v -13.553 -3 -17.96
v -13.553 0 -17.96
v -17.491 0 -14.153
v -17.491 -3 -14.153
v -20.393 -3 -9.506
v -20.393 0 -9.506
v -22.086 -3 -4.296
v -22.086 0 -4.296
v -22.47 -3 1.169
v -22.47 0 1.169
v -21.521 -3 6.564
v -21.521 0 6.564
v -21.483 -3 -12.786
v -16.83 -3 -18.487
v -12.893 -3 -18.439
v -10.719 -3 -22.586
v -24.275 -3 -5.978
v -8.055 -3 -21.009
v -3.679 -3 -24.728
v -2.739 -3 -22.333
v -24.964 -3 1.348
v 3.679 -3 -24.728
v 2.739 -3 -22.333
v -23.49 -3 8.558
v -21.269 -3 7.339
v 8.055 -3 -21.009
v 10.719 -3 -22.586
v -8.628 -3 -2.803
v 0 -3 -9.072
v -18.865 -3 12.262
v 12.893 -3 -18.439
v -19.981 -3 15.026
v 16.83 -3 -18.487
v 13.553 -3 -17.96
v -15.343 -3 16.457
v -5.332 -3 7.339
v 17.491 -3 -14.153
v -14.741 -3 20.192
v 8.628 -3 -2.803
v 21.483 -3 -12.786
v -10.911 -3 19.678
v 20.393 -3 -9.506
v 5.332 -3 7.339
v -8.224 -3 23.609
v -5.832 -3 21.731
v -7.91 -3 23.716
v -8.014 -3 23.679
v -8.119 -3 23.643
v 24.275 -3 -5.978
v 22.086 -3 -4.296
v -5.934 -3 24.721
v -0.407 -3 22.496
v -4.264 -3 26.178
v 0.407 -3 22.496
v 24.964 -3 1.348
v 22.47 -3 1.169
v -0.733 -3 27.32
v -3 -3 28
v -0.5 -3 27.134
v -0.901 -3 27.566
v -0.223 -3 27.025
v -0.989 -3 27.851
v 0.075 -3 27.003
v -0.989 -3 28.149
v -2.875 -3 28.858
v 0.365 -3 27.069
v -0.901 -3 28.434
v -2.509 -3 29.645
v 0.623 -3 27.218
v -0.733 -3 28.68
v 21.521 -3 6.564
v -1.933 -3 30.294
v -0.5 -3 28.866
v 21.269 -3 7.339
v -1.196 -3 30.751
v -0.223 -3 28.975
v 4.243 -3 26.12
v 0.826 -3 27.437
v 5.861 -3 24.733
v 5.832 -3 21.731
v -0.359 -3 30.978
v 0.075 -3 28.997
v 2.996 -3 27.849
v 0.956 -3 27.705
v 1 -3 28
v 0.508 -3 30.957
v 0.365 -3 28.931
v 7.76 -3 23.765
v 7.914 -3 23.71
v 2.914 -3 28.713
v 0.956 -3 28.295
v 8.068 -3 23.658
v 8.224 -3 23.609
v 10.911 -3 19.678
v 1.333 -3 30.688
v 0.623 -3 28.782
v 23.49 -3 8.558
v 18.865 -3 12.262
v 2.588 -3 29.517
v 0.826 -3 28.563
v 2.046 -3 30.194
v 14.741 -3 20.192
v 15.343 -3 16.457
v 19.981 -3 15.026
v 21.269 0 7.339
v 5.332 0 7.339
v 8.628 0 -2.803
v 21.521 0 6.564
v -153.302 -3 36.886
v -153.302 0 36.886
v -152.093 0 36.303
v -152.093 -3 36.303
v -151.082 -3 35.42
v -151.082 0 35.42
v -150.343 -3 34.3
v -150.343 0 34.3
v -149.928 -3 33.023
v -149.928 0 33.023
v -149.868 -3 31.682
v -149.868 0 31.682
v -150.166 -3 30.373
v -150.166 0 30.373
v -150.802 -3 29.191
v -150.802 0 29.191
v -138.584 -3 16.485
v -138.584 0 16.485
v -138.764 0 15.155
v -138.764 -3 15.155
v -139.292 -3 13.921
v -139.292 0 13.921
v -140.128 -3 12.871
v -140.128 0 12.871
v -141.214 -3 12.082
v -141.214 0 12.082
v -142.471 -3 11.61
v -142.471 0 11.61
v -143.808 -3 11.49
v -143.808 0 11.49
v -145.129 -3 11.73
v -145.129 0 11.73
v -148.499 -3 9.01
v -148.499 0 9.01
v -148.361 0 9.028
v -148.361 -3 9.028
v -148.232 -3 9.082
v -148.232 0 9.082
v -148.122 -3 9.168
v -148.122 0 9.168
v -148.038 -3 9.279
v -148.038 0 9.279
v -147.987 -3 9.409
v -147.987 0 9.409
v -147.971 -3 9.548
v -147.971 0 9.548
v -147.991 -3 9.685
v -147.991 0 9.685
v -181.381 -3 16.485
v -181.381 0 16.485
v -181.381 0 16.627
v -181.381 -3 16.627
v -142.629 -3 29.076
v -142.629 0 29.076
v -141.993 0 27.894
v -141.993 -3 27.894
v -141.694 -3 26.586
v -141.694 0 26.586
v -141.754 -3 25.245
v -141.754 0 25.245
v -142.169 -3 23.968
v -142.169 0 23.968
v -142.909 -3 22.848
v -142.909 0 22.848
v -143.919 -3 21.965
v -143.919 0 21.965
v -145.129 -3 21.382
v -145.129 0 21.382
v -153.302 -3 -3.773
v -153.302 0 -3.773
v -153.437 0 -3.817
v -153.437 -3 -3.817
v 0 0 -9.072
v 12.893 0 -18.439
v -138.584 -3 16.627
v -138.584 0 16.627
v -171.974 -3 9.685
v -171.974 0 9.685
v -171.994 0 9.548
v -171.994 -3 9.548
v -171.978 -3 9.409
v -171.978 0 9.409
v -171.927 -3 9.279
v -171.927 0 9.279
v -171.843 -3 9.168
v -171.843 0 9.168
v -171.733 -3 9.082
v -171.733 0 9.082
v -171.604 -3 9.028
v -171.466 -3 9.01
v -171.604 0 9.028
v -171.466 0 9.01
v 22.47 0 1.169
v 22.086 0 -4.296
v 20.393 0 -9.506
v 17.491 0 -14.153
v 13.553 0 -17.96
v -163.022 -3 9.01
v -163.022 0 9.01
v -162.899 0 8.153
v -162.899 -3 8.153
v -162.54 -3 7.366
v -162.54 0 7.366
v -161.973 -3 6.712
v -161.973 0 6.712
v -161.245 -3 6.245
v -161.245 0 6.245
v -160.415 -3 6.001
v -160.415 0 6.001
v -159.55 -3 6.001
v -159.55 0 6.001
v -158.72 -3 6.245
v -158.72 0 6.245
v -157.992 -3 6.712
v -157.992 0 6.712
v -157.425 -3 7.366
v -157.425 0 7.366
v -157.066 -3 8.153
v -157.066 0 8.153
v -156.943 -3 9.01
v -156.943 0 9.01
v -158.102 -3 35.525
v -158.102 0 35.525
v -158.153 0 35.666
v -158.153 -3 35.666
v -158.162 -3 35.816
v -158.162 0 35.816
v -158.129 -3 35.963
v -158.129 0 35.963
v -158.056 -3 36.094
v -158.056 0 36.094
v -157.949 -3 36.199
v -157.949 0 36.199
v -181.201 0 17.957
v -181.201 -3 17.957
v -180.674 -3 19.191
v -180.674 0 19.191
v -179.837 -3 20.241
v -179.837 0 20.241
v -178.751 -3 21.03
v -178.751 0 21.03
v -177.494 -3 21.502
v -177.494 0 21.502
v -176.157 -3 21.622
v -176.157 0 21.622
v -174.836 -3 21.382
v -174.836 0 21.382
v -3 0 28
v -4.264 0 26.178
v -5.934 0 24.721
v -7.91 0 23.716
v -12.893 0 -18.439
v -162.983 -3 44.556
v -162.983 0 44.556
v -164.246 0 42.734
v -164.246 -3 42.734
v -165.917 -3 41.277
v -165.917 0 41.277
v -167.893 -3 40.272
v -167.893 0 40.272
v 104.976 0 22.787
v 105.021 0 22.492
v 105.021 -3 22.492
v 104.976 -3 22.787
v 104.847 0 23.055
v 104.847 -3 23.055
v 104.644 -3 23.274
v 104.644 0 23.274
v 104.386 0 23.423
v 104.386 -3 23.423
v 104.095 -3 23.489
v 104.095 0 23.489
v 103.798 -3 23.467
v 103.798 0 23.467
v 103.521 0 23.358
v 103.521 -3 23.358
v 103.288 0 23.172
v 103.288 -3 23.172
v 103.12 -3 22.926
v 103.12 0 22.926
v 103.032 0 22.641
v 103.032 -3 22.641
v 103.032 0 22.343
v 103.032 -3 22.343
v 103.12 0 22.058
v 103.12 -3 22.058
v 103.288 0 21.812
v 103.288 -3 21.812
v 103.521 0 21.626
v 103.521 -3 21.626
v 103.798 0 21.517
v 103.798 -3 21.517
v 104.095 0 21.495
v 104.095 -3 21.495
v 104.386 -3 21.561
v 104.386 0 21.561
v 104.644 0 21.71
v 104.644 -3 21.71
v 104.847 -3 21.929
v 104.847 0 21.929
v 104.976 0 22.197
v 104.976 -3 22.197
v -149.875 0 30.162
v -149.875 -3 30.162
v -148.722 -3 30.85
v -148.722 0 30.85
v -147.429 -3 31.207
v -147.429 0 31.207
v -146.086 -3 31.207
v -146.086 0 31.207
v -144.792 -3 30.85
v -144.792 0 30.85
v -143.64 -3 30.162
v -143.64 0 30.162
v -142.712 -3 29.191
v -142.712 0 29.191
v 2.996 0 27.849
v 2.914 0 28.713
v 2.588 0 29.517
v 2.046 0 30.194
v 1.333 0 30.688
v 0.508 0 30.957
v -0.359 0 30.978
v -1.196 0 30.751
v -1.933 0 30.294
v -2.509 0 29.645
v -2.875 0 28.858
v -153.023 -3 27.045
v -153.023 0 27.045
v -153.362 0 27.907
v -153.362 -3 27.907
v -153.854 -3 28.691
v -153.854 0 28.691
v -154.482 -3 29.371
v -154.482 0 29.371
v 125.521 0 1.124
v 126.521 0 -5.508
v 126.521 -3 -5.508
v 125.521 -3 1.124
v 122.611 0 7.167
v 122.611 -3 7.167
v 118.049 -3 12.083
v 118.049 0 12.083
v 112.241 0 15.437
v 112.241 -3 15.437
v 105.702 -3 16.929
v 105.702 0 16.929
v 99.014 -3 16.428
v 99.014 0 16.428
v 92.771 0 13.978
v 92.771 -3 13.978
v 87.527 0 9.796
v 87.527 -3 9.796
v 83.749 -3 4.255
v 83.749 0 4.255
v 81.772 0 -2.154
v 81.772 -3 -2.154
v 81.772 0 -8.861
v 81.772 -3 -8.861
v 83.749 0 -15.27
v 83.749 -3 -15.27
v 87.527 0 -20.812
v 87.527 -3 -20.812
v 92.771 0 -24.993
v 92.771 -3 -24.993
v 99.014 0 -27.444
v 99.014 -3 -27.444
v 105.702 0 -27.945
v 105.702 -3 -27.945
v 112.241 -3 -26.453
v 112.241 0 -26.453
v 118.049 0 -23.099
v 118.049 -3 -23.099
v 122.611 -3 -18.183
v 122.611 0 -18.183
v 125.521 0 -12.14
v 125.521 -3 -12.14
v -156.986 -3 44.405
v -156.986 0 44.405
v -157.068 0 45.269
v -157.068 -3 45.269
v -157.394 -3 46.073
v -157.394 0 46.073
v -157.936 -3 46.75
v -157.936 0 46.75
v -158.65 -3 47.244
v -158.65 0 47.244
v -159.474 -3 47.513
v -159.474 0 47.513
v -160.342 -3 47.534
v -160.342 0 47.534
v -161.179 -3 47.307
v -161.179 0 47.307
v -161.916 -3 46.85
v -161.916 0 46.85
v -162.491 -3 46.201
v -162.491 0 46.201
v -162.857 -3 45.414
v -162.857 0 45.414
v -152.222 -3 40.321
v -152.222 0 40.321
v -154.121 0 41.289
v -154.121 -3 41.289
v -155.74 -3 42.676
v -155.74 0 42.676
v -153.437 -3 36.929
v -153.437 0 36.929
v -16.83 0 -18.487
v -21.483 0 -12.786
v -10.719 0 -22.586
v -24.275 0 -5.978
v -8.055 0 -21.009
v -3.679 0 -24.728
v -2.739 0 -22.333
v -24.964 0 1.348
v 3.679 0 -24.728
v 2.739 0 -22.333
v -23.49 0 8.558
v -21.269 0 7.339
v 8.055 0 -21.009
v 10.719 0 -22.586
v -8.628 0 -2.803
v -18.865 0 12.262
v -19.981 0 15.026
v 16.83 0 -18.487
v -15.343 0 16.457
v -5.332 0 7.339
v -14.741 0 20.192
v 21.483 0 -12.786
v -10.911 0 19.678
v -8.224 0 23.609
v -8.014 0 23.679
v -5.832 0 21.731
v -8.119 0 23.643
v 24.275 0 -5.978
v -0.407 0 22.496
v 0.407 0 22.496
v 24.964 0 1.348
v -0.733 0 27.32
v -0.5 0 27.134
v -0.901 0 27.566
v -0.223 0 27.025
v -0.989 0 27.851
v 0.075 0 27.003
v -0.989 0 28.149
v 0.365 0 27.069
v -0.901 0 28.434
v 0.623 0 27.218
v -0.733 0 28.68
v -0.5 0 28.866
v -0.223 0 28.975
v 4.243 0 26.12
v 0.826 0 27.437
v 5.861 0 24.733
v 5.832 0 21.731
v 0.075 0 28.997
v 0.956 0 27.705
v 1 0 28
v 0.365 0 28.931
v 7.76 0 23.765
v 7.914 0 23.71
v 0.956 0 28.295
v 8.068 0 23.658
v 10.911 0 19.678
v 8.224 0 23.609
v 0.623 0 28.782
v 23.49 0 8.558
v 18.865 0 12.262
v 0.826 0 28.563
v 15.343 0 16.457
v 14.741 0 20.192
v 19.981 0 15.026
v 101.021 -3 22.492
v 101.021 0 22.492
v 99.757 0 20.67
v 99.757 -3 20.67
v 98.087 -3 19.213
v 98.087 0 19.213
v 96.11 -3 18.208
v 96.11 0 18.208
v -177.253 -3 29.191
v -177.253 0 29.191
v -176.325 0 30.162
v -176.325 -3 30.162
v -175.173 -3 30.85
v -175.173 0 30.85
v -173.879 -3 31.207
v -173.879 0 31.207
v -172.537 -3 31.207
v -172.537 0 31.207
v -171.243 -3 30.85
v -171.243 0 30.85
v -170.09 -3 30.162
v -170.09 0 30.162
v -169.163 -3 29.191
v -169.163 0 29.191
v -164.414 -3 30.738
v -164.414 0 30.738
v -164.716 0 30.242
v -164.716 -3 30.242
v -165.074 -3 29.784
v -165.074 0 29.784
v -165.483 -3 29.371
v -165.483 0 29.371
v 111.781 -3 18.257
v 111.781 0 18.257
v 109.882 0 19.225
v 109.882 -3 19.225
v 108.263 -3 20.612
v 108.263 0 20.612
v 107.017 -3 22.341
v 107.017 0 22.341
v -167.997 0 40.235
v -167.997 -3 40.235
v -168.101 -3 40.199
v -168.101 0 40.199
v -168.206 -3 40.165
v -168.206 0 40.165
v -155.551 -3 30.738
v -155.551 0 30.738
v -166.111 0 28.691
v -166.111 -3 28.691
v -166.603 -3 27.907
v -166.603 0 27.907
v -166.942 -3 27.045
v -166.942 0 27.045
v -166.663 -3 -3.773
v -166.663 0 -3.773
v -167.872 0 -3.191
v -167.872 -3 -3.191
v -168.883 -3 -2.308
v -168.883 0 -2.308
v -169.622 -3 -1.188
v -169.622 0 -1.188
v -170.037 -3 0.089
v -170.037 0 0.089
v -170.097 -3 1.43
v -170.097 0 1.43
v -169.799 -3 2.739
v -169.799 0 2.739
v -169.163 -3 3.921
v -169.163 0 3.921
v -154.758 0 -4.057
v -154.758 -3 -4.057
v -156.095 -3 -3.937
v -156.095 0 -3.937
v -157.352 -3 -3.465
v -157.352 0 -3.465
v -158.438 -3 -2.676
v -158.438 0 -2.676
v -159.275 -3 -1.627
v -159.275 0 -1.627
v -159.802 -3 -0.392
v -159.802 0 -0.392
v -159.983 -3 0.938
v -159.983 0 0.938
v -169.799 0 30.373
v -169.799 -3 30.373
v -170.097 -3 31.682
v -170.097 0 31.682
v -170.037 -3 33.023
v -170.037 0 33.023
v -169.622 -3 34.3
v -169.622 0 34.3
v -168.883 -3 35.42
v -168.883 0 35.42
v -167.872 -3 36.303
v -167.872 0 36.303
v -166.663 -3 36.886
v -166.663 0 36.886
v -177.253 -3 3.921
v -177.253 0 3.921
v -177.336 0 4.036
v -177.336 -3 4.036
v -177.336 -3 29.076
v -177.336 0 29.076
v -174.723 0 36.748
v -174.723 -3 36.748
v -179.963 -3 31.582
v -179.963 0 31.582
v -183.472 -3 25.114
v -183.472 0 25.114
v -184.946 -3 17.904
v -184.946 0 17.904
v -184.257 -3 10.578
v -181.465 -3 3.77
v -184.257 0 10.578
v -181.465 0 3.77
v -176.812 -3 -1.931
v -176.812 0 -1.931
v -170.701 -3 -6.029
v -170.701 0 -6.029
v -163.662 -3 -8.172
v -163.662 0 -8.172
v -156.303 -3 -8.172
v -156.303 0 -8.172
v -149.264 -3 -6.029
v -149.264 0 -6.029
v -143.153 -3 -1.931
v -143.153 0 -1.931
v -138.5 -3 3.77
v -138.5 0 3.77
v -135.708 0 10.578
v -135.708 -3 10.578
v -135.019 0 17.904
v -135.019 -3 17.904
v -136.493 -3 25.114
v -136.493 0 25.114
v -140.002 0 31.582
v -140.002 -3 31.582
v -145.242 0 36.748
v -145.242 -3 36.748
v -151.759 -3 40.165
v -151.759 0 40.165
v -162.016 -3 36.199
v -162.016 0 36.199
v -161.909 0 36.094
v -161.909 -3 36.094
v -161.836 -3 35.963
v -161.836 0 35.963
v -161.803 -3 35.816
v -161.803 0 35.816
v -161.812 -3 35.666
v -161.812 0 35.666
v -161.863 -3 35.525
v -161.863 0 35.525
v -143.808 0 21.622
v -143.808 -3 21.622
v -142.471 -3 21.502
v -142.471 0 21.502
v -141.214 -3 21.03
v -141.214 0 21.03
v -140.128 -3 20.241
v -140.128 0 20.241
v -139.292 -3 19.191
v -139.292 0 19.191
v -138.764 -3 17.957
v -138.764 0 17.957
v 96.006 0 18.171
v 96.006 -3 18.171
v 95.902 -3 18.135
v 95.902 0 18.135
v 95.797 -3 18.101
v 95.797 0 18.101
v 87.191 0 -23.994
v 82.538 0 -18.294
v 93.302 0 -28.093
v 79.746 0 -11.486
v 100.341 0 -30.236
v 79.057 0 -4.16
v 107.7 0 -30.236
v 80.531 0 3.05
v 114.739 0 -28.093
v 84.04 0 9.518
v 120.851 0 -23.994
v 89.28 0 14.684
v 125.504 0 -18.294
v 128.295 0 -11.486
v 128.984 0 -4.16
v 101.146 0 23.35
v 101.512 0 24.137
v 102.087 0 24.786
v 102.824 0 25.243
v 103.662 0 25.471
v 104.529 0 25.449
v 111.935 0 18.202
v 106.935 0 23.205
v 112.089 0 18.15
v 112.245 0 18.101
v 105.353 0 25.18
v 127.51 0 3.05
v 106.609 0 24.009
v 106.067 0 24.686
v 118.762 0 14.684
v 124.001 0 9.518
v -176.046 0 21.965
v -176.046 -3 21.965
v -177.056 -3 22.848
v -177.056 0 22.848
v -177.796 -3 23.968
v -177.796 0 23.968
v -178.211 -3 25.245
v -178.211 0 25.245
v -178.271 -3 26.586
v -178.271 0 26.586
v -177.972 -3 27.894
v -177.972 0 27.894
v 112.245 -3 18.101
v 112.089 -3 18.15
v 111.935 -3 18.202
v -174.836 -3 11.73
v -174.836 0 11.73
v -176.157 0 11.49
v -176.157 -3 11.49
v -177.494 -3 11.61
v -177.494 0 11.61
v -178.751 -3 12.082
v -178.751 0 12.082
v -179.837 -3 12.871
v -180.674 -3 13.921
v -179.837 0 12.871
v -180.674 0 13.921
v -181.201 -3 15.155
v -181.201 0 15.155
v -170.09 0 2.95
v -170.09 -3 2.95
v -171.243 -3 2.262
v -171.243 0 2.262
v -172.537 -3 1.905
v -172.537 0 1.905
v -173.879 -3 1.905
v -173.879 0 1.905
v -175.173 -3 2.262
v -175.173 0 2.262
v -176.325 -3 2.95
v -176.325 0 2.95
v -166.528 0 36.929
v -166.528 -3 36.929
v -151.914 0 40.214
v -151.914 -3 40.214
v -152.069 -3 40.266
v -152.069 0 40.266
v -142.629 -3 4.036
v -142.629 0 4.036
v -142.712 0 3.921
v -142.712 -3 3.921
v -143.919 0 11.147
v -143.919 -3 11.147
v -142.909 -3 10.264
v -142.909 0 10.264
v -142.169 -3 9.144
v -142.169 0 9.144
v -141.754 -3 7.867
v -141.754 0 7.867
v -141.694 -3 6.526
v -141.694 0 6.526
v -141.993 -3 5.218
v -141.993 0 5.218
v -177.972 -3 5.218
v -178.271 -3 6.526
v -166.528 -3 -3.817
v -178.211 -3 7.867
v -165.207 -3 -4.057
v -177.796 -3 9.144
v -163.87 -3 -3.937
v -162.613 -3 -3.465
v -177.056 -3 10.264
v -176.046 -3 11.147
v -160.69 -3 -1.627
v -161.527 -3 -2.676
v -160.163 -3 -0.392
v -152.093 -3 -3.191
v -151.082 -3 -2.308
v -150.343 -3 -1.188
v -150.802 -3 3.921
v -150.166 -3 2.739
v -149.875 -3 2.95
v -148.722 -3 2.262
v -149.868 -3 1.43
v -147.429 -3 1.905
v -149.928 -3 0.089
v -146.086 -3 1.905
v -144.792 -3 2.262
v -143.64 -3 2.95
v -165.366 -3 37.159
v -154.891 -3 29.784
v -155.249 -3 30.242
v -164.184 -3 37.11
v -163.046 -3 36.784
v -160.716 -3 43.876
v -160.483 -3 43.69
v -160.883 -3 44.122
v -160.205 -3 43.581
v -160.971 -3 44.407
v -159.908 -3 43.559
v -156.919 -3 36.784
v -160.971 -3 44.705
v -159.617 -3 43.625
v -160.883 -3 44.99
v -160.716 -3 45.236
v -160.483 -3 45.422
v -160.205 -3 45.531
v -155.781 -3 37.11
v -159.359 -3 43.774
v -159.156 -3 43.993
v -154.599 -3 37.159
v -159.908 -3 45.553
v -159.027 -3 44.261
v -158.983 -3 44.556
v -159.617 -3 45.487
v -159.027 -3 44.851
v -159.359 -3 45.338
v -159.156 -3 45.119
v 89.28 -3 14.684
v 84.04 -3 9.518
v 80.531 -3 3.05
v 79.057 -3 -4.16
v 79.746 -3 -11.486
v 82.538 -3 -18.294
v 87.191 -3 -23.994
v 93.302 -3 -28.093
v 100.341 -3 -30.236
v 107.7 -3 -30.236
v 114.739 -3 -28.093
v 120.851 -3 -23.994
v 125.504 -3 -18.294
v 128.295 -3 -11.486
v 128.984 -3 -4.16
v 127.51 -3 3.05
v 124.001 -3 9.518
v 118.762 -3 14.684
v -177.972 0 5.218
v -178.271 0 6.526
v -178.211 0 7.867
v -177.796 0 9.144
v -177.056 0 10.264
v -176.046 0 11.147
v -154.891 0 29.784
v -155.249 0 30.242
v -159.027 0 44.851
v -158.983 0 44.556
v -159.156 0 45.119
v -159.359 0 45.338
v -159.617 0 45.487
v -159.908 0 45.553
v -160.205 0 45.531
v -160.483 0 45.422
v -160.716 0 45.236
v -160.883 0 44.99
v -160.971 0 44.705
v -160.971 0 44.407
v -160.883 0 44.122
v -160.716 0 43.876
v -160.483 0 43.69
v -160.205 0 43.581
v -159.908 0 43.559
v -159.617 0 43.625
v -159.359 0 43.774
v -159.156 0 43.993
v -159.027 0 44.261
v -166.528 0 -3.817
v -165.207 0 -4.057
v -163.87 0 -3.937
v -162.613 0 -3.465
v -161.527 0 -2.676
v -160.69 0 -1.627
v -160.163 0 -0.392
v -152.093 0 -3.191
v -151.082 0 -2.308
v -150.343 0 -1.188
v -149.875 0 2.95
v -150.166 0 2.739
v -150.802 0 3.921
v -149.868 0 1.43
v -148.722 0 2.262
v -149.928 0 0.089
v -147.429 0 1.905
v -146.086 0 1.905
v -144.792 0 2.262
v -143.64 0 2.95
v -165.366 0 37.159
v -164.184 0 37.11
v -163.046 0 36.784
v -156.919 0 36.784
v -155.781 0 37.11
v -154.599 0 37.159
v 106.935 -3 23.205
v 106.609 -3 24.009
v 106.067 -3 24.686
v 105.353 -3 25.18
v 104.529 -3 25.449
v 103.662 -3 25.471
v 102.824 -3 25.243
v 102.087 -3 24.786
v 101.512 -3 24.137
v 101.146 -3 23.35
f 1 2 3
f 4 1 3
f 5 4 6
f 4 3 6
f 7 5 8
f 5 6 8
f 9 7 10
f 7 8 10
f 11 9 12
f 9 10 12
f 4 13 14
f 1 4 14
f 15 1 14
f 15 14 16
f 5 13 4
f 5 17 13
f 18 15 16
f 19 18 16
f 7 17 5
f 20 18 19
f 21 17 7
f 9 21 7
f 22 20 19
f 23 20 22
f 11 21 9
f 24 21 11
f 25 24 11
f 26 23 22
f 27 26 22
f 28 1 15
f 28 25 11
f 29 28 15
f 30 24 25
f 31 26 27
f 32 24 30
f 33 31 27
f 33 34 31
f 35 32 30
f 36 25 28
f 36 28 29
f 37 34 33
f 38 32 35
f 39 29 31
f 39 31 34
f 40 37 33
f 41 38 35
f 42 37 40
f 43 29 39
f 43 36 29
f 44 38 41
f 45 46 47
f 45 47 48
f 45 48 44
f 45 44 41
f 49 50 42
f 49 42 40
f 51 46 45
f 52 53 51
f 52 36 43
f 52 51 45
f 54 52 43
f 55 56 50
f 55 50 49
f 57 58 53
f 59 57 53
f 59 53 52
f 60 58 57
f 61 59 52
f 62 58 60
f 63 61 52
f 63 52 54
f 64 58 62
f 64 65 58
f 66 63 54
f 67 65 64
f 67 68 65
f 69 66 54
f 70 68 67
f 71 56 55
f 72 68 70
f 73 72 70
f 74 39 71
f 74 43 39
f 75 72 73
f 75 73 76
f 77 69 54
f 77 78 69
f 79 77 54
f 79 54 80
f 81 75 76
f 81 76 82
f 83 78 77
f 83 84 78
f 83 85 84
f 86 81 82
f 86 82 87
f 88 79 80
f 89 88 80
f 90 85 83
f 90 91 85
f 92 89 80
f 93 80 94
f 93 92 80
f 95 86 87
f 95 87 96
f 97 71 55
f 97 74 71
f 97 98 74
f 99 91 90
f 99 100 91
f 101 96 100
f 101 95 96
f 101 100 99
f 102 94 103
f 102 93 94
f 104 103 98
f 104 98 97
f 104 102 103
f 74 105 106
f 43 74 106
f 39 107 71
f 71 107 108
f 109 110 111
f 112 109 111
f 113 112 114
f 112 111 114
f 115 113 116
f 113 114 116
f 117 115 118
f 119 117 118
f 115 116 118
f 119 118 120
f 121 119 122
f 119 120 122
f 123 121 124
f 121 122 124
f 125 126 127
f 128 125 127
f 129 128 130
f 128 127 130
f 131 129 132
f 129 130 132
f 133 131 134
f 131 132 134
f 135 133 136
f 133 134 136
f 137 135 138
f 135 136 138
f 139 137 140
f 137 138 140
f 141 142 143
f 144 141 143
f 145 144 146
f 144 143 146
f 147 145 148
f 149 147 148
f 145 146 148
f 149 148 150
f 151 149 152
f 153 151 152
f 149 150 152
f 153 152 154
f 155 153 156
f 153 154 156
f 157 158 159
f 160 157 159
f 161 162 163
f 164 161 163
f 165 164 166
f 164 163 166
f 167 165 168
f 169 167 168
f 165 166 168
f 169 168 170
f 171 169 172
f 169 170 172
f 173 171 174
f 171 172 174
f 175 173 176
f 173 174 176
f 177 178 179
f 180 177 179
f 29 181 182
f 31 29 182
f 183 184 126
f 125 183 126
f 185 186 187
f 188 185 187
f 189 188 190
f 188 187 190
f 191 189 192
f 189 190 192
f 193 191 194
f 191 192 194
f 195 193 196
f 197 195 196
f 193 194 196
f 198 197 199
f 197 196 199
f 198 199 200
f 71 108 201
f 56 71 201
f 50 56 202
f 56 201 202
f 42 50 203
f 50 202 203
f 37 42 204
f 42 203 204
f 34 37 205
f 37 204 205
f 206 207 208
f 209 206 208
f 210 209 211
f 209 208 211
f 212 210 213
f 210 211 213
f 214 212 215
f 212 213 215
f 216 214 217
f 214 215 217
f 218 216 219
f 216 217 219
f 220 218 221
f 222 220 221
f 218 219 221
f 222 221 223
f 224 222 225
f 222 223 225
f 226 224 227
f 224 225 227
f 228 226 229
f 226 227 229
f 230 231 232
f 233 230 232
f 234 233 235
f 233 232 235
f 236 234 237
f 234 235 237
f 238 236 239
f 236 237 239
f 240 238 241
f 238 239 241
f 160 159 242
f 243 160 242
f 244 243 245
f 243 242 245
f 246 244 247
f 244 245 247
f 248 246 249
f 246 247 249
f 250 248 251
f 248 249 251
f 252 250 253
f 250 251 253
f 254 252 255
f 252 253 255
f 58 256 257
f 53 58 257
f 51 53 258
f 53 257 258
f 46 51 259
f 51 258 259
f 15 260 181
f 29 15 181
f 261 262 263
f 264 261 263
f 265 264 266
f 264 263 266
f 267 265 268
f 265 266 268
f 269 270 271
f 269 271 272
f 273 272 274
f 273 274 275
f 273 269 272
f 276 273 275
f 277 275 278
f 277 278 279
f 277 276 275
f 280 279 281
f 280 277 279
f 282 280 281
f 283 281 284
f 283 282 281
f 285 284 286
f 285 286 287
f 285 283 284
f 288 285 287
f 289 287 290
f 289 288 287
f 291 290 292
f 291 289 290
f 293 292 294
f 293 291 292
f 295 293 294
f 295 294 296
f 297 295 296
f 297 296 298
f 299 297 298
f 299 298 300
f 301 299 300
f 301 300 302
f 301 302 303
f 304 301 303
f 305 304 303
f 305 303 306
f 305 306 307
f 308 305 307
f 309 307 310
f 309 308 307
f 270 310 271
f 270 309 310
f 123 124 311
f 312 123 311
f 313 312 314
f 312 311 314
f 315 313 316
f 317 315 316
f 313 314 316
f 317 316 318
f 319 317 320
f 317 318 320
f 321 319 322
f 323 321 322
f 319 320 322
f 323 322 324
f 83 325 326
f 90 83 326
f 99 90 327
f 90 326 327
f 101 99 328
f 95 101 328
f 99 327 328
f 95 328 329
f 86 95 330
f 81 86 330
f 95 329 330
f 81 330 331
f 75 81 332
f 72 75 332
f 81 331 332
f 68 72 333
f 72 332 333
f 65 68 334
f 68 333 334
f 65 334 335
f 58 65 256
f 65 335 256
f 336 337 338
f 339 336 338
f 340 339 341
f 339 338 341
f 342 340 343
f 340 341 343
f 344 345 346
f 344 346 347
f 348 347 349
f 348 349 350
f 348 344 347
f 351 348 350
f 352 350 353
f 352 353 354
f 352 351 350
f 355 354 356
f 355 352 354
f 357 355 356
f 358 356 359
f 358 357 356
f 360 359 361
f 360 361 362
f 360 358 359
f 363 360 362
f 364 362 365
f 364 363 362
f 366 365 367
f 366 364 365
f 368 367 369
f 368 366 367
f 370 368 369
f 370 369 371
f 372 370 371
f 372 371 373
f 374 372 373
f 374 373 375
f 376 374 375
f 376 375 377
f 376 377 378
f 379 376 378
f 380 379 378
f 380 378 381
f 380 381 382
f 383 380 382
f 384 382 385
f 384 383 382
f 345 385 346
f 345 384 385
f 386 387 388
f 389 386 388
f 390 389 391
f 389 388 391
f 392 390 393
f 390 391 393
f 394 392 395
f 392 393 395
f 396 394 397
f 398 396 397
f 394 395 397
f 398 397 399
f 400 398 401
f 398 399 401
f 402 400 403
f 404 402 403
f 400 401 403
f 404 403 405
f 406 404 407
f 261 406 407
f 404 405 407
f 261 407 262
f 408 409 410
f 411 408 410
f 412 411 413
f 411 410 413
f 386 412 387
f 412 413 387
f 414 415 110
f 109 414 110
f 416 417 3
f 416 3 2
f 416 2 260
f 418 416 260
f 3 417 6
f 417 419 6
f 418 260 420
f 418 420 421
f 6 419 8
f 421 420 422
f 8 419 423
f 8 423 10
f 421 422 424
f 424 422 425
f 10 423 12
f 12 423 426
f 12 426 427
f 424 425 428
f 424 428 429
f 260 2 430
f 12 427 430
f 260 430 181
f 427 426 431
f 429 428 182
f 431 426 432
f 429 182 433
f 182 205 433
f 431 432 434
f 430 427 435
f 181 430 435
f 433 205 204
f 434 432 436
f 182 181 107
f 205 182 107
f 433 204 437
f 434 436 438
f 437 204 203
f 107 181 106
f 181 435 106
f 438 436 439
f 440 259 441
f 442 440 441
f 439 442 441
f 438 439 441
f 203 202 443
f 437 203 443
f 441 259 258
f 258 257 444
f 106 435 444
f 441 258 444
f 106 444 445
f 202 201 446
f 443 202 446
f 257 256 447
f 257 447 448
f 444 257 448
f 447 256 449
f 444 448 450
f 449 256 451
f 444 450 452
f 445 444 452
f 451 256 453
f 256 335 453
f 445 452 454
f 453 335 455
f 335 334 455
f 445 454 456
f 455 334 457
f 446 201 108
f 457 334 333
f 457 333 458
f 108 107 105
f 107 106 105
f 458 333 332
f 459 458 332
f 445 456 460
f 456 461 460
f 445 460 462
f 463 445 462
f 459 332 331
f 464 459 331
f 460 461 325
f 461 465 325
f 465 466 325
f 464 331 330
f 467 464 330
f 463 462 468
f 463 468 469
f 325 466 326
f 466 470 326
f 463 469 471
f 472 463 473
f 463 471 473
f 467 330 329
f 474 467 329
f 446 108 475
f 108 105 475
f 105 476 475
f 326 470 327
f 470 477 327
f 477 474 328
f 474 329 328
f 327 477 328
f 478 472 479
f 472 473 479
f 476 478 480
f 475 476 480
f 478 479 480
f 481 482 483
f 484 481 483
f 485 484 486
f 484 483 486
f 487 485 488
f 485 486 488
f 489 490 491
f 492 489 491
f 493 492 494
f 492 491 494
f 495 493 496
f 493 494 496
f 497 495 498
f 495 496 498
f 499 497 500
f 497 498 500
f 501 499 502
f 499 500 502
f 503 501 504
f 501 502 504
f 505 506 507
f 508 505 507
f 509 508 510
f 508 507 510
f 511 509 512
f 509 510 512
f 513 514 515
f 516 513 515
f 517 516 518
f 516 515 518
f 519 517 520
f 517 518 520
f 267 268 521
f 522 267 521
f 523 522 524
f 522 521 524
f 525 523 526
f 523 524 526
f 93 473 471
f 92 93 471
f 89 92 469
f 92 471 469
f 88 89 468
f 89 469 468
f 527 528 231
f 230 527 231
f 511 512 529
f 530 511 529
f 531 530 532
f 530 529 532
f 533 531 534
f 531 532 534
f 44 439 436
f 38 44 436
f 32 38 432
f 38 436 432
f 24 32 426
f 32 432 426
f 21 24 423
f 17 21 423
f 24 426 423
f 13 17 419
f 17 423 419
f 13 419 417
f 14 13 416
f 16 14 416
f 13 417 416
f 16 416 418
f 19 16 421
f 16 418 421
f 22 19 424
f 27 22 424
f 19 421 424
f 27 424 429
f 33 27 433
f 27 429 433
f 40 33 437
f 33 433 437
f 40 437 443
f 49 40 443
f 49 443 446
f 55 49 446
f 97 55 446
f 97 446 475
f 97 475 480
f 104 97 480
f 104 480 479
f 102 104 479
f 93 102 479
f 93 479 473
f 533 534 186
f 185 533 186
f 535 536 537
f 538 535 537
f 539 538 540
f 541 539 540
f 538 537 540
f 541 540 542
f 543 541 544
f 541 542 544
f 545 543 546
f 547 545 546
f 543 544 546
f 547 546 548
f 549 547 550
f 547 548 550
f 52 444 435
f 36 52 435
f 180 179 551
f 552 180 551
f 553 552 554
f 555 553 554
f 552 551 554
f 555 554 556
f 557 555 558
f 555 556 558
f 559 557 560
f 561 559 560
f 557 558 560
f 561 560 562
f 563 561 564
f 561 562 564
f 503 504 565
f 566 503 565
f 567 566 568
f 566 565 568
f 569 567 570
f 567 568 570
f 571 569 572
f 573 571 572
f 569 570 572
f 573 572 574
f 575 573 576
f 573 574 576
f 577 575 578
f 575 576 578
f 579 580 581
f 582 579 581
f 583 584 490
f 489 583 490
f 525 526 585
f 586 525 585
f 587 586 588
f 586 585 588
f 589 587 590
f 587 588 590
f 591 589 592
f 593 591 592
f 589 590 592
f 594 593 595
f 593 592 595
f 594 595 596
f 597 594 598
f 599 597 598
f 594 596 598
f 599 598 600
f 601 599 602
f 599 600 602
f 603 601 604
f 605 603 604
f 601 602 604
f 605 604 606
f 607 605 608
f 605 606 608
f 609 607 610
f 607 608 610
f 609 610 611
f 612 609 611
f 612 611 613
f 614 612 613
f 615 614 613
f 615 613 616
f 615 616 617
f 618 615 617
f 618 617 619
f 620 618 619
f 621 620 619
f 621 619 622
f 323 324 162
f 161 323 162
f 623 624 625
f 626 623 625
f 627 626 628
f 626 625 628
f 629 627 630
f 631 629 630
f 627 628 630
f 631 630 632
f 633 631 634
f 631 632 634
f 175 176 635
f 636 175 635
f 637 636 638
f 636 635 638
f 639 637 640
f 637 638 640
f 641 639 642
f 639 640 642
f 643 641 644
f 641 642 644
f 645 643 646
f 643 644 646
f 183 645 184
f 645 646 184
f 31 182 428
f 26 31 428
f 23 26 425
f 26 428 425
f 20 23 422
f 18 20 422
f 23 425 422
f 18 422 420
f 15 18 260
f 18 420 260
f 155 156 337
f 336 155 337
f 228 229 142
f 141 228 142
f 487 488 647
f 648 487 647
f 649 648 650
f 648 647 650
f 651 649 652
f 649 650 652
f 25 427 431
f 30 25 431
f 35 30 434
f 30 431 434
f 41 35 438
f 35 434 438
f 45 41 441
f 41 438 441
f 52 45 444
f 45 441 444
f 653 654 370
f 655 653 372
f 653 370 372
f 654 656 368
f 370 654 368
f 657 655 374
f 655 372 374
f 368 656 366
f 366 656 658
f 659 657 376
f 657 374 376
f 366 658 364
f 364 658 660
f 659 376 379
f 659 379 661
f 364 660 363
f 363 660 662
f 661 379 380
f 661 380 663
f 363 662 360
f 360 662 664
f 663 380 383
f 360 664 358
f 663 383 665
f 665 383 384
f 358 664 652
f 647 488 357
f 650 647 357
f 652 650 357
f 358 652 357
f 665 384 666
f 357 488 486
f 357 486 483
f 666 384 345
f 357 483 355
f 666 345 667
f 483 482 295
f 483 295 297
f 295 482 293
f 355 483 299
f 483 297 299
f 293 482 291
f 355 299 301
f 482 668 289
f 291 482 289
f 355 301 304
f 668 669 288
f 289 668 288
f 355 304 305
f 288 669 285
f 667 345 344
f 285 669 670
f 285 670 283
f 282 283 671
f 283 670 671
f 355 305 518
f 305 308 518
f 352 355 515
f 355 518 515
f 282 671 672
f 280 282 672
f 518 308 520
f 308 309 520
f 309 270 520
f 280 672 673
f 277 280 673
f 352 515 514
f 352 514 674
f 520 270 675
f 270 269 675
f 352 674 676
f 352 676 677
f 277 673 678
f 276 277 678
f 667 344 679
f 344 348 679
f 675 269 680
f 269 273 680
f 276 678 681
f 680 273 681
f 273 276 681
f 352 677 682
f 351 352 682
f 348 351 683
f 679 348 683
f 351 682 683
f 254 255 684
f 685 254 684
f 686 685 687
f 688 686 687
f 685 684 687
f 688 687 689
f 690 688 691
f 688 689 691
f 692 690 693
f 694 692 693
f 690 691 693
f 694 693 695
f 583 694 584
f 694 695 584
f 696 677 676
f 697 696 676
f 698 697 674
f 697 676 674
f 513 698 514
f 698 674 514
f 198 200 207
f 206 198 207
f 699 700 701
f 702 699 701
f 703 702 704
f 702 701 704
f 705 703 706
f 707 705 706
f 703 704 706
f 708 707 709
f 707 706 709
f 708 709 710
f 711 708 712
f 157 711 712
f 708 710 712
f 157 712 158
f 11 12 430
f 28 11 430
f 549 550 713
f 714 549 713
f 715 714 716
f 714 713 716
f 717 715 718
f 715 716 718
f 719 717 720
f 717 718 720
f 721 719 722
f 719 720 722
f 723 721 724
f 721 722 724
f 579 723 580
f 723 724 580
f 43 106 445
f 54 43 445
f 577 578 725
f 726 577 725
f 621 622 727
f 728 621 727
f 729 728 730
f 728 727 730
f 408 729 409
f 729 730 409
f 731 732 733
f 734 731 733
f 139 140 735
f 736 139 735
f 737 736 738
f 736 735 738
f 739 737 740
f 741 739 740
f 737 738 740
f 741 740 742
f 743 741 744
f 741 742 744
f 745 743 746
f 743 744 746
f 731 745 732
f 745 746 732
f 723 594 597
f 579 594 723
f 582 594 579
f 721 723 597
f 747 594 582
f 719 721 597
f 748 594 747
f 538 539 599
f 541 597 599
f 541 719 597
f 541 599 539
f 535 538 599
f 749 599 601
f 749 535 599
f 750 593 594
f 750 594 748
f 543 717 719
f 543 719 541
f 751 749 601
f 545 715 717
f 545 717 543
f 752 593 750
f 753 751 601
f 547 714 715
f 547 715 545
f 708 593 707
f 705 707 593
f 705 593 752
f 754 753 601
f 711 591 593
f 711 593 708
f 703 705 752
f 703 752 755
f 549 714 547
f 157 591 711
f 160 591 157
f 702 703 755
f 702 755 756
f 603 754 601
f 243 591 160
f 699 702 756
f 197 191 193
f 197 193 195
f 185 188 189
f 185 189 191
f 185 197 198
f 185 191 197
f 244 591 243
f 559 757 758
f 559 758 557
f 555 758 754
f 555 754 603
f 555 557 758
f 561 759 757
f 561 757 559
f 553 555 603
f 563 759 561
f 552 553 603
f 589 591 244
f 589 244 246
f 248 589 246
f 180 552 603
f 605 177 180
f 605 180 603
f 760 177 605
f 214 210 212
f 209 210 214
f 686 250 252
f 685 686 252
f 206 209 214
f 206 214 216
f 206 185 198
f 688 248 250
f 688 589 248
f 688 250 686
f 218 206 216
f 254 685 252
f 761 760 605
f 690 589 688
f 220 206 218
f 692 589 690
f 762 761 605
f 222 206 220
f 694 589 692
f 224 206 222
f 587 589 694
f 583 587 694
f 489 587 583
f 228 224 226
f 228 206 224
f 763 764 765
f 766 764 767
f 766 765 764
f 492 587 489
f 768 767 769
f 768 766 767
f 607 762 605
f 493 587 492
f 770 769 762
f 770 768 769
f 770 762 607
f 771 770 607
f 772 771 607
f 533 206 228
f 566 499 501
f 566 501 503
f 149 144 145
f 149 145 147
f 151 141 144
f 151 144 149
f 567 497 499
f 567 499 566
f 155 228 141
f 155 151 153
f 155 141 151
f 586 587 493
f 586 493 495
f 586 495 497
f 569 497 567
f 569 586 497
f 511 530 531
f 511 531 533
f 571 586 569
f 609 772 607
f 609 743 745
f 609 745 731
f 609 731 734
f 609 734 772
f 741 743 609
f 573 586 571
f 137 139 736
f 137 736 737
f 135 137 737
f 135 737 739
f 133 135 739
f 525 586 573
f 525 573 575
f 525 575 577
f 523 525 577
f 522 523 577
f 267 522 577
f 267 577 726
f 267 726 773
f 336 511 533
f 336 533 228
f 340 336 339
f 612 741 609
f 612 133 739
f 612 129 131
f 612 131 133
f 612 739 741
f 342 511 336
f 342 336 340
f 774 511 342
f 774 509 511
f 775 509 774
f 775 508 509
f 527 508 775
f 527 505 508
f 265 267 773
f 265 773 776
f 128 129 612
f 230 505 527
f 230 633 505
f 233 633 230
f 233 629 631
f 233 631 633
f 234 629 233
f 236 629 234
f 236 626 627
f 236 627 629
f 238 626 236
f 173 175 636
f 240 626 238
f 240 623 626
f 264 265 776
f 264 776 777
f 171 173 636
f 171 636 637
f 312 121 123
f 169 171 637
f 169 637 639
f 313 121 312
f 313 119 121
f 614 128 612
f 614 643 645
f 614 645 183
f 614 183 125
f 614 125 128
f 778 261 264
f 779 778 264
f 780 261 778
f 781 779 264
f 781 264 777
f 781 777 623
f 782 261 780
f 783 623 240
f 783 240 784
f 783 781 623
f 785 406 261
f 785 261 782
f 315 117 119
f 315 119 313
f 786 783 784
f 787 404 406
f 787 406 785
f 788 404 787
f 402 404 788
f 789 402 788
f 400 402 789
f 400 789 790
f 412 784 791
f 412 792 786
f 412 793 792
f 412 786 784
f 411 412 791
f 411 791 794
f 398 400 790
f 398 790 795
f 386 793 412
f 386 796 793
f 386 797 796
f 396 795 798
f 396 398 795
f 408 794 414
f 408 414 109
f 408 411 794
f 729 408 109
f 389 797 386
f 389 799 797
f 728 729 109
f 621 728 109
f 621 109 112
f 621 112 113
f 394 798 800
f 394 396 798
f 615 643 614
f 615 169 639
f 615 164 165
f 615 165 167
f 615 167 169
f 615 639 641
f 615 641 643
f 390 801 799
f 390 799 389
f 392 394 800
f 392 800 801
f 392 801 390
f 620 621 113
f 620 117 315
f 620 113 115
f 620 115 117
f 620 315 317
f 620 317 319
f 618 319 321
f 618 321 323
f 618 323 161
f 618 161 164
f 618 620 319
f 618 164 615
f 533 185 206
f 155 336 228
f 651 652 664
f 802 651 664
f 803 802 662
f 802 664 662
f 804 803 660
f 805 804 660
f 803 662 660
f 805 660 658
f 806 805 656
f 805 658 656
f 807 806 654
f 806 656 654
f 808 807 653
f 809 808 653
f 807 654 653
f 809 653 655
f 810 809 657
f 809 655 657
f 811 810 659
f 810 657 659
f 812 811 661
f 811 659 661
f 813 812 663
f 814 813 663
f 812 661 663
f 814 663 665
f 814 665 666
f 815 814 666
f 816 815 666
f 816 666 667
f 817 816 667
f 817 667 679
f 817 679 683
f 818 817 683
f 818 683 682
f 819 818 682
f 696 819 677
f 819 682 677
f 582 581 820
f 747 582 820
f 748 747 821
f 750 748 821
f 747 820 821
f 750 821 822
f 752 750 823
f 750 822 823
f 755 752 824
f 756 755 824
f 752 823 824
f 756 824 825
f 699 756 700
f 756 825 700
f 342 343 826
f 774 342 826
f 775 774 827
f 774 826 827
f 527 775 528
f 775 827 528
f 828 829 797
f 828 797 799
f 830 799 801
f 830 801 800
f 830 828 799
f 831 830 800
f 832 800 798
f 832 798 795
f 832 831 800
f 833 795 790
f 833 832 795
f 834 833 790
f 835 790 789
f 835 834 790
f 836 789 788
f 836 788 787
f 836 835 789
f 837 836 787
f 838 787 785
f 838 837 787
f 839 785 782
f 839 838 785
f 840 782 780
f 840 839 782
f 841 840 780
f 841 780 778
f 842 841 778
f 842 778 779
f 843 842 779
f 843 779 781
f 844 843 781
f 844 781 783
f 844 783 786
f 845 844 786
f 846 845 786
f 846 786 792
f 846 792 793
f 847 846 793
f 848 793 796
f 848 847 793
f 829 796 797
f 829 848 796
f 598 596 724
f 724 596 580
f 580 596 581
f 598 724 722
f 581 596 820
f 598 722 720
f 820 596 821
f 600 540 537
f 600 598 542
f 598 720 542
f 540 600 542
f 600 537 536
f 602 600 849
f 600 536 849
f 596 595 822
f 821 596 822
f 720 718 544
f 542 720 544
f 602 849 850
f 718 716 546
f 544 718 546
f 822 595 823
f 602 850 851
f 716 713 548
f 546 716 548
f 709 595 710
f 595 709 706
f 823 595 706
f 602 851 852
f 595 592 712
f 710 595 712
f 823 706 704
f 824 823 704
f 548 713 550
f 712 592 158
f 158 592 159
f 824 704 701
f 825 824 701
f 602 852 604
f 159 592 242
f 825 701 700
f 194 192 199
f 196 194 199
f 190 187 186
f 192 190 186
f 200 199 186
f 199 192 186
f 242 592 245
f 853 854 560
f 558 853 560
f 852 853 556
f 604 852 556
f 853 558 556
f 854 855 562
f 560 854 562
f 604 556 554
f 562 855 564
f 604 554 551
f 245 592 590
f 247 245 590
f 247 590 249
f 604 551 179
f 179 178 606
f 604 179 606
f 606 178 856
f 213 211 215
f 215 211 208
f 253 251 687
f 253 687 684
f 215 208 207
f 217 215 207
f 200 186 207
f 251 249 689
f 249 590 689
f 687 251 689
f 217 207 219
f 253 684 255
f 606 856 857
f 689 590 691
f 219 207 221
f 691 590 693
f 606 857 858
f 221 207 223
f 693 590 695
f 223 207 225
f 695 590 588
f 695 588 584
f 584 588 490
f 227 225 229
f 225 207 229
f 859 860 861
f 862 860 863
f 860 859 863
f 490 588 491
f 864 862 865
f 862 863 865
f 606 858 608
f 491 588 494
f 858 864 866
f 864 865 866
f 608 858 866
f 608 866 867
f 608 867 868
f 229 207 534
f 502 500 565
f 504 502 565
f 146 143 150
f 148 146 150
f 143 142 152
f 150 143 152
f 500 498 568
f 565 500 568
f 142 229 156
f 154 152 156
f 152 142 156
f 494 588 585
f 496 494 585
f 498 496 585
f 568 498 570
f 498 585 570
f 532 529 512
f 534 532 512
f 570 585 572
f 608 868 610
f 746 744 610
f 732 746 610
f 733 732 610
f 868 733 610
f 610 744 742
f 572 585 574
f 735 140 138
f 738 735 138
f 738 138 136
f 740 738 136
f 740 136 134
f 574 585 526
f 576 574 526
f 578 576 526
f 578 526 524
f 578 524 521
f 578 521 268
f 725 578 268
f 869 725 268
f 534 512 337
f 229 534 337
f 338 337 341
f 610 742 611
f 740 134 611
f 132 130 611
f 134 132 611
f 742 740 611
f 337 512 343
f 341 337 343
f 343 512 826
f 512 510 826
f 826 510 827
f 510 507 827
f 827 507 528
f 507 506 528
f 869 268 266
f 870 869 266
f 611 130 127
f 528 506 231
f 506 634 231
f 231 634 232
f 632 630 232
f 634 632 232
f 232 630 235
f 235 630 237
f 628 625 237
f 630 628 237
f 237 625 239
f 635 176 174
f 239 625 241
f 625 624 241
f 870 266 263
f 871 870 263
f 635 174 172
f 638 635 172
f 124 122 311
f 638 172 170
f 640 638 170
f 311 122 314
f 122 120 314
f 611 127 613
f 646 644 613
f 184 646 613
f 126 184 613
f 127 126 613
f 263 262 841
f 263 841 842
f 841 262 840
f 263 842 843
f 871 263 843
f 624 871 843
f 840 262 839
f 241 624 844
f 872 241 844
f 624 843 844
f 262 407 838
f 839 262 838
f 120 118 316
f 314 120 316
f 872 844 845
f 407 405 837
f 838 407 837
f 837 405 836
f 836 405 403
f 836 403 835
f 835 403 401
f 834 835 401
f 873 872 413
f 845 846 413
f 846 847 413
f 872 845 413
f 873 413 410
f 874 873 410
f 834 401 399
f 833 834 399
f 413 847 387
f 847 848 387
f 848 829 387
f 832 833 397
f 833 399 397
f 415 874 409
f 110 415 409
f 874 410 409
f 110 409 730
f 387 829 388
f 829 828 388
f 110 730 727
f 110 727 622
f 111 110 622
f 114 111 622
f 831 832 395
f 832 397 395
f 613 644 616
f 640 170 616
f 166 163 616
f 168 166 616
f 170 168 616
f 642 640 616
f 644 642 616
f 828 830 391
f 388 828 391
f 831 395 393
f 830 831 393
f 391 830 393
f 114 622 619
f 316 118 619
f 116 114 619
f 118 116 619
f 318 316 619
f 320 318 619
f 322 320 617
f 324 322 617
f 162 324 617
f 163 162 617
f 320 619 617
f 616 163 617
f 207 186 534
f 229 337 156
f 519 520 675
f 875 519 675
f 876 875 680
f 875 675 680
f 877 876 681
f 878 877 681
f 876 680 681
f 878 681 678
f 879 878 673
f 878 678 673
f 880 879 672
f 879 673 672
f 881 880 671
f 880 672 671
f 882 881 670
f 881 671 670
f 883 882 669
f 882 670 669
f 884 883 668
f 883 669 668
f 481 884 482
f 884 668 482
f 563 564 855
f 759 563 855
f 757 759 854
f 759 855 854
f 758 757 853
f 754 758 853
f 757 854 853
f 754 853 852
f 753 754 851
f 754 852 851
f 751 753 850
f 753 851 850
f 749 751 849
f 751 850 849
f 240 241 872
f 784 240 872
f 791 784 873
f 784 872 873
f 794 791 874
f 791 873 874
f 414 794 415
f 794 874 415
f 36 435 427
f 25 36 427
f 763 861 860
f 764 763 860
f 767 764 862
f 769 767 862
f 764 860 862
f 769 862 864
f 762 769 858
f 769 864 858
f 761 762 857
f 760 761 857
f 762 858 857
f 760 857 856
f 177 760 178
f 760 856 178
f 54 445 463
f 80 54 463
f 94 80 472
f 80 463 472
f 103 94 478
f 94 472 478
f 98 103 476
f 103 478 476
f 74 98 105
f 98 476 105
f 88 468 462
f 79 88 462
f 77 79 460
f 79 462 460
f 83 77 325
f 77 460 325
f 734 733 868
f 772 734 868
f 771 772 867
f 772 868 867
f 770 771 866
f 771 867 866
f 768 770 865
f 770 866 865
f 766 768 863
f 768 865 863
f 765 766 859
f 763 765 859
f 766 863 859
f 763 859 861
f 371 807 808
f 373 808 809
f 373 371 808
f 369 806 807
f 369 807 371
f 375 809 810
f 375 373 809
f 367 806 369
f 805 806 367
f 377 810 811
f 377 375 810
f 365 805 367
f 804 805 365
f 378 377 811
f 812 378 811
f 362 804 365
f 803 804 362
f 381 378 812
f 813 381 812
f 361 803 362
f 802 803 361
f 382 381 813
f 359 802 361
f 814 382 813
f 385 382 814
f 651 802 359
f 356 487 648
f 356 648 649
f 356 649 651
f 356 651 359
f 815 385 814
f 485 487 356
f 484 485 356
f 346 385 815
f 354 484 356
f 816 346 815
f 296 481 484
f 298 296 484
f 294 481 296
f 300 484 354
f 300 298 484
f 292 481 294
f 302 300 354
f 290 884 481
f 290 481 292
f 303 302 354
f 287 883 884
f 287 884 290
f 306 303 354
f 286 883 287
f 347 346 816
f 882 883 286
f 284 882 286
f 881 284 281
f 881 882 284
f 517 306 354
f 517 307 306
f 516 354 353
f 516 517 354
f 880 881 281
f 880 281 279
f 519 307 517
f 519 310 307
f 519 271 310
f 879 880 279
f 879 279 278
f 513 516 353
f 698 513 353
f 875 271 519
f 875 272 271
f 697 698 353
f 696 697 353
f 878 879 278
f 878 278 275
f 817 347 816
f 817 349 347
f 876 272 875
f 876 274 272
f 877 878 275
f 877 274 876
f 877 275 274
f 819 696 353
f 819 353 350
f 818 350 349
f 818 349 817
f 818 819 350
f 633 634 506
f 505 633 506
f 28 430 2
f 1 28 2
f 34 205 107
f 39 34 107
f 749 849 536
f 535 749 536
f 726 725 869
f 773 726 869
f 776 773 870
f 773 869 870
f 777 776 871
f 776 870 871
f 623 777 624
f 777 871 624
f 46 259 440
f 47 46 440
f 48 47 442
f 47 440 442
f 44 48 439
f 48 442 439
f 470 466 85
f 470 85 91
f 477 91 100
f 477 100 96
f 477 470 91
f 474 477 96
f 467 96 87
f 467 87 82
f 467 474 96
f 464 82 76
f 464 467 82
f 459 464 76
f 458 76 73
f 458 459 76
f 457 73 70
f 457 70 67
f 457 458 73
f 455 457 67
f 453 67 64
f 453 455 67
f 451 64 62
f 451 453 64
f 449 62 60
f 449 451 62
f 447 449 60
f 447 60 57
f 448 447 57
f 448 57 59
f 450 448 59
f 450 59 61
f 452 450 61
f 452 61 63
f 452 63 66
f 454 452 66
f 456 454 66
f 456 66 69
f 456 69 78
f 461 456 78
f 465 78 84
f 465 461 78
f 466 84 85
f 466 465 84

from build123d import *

# Parameters (mm, degrees)
F0_R     = 22.5
F0_R_2   = 1
F1_DEPTH = 3


with BuildPart() as f1:
    # F0 (on Front) → F1 (new body)
    with BuildSketch(Plane.XZ):
        with BuildLine():
            ThreePointArc((101.020595, 22.492121), (98.966841, 19.889855), (96.110283, 18.207663))
            ThreePointArc((96.110283, 18.207663), (95.953969, 18.15276), (95.796672, 18.100744))
            ThreePointArc((95.796672, 18.100744), (104.020595, -30.507879), (112.244519, 18.100744))
            ThreePointArc((112.244519, 18.100744), (112.01172, 18.175785), (111.781047, 18.257124))
            ThreePointArc((111.781047, 18.257124), (109.03143, 19.870558), (107.016805, 22.341356))
            ThreePointArc((107.016805, 22.341356), (104.096001, 25.491173), (101.020595, 22.492121))
        make_face()
        with Locations((104.020595, -5.507879)):
            Circle(F0_R, mode=Mode.SUBTRACT)
        with Locations((104.020595, 22.492121)):
            Circle(F0_R_2, mode=Mode.SUBTRACT)
        with BuildLine():
            ThreePointArc((-3, 28), (-5.053754, 25.397734), (-7.910312, 23.715543))
            ThreePointArc((-7.910312, 23.715543), (-8.066626, 23.660639), (-8.223924, 23.608623))
            ThreePointArc((-8.223924, 23.608623), (0, -25), (8.223924, 23.608623))
            ThreePointArc((8.223924, 23.608623), (7.991125, 23.683664), (7.760451, 23.765004))
            ThreePointArc((7.760451, 23.765004), (5.010835, 25.378438), (2.996209, 27.849235))
            ThreePointArc((2.996209, 27.849235), (0.075406, 30.999052), (-3, 28))
        make_face()
        with BuildLine():
            Line((-12.893449, -18.439332), (0, -9.071693))
            Line((0, -9.071693), (12.893449, -18.439332))
            ThreePointArc((12.893449, -18.439332), (0, -22.5), (-12.893449, -18.439332))
        make_face(mode=Mode.SUBTRACT)
        with BuildLine():
            Line((-8.627693, -2.803307), (-13.552552, -17.960466))
            ThreePointArc((-13.552552, -17.960466), (-21.398772, -6.952882), (-21.521142, 6.564332))
            Line((-21.521142, 6.564332), (-8.627693, -2.803307))
        make_face(mode=Mode.SUBTRACT)
        with BuildLine():
            Line((8.627693, -2.803307), (21.521142, 6.564332))
            ThreePointArc((21.521142, 6.564332), (21.398772, -6.952882), (13.552552, -17.960466))
            Line((13.552552, -17.960466), (8.627693, -2.803307))
        make_face(mode=Mode.SUBTRACT)
        with BuildLine():
            ThreePointArc((-21.269387, 7.339154), (-13.225168, 18.202882), (-0.407348, 22.496312))
            Line((-0.407348, 22.496312), (-5.332207, 7.339154))
            Line((-5.332207, 7.339154), (-21.269387, 7.339154))
        make_face(mode=Mode.SUBTRACT)
        with BuildLine():
            Line((5.332207, 7.339154), (0.407348, 22.496312))
            ThreePointArc((0.407348, 22.496312), (13.225168, 18.202882), (21.269387, 7.339154))
            Line((21.269387, 7.339154), (5.332207, 7.339154))
        make_face(mode=Mode.SUBTRACT)
        with Locations((0, 28)):
            Circle(F0_R_2, mode=Mode.SUBTRACT)
        with BuildLine():
            ThreePointArc((-162.982522, 44.556018), (-165.036276, 41.953752), (-167.892835, 40.27156))
            ThreePointArc((-167.892835, 40.27156), (-168.049148, 40.216657), (-168.206446, 40.164641))
            ThreePointArc((-168.206446, 40.164641), (-159.982522, -8.443982), (-151.758598, 40.164641))
            ThreePointArc((-151.758598, 40.164641), (-151.991397, 40.239682), (-152.222071, 40.321021))
            ThreePointArc((-152.222071, 40.321021), (-154.971687, 41.934455), (-156.986313, 44.405253))
            ThreePointArc((-156.986313, 44.405253), (-159.907116, 47.55507), (-162.982522, 44.556018))
        make_face()
        with BuildLine():
            ThreePointArc((-157.94863, 36.199304), (-155.781323, 37.109887), (-153.437437, 36.92939))
            Line((-153.437437, 36.92939), (-153.302439, 36.885527))
            ThreePointArc((-153.302439, 36.885527), (-150.092241, 33.675329), (-150.802439, 29.191318))
            ThreePointArc((-150.802439, 29.191318), (-146.757354, 31.252392), (-142.712269, 29.191318))
            Line((-142.712269, 29.191318), (-142.628835, 29.076482))
            ThreePointArc((-142.628835, 29.076482), (-141.918638, 24.59247), (-145.128835, 21.382273))
            ThreePointArc((-145.128835, 21.382273), (-140.644824, 20.672075), (-138.58375, 16.62699))
            Line((-138.58375, 16.62699), (-138.58375, 16.485045))
            ThreePointArc((-138.58375, 16.485045), (-140.644824, 12.43996), (-145.128835, 11.729762))
            ThreePointArc((-145.128835, 11.729762), (-141.918638, 8.519565), (-142.628835, 4.035553))
            Line((-142.628835, 4.035553), (-142.712269, 3.920717))
            ThreePointArc((-142.712269, 3.920717), (-146.757354, 1.859643), (-150.802439, 3.920717))
            ThreePointArc((-150.802439, 3.920717), (-150.092241, -0.563294), (-153.302439, -3.773492))
            Line((-153.302439, -3.773492), (-153.437437, -3.817355))
            ThreePointArc((-153.437437, -3.817355), (-157.921448, -3.107158), (-159.982522, 0.937927))
            ThreePointArc((-159.982522, 0.937927), (-162.043596, -3.107158), (-166.527607, -3.817355))
            Line((-166.527607, -3.817355), (-166.662605, -3.773492))
            ThreePointArc((-166.662605, -3.773492), (-169.872803, -0.563294), (-169.162605, 3.920717))
            ThreePointArc((-169.162605, 3.920717), (-173.20769, 1.859643), (-177.252775, 3.920717))
            Line((-177.252775, 3.920717), (-177.336209, 4.035553))
            ThreePointArc((-177.336209, 4.035553), (-178.046406, 8.519565), (-174.836209, 11.729762))
            ThreePointArc((-174.836209, 11.729762), (-179.32022, 12.43996), (-181.381294, 16.485045))
            Line((-181.381294, 16.485045), (-181.381294, 16.62699))
            ThreePointArc((-181.381294, 16.62699), (-179.32022, 20.672075), (-174.836209, 21.382273))
            ThreePointArc((-174.836209, 21.382273), (-178.046406, 24.59247), (-177.336209, 29.076482))
            Line((-177.336209, 29.076482), (-177.252775, 29.191318))
            ThreePointArc((-177.252775, 29.191318), (-173.20769, 31.252392), (-169.162605, 29.191318))
            ThreePointArc((-169.162605, 29.191318), (-169.872803, 33.675329), (-166.662605, 36.885527))
            Line((-166.662605, 36.885527), (-166.527607, 36.92939))
            ThreePointArc((-166.527607, 36.92939), (-164.183721, 37.109887), (-162.016414, 36.199304))
            ThreePointArc((-162.016414, 36.199304), (-161.814482, 35.890711), (-161.863449, 35.525185))
            Line((-161.863449, 35.525185), (-164.413654, 30.737998))
            ThreePointArc((-164.413654, 30.737998), (-164.88859, 30.007831), (-165.483037, 29.371166))
            ThreePointArc((-165.483037, 29.371166), (-166.375202, 28.310399), (-166.941866, 27.045458))
            Line((-166.941866, 27.045458), (-171.973581, 9.685492))
            ThreePointArc((-171.973581, 9.685492), (-171.888485, 9.220788), (-171.465842, 9.009688))
            Line((-171.465842, 9.009688), (-163.022149, 9.009688))
            ThreePointArc((-163.022149, 9.009688), (-159.982522, 5.970062), (-156.942895, 9.009688))
            Line((-156.942895, 9.009688), (-148.499202, 9.009688))
            ThreePointArc((-148.499202, 9.009688), (-148.076559, 9.220788), (-147.991463, 9.685492))
            Line((-147.991463, 9.685492), (-153.023178, 27.045458))
            ThreePointArc((-153.023178, 27.045458), (-153.589842, 28.310399), (-154.482007, 29.371166))
            ThreePointArc((-154.482007, 29.371166), (-155.076454, 30.007831), (-155.55139, 30.737998))
            Line((-155.55139, 30.737998), (-158.101595, 35.525185))
            ThreePointArc((-158.101595, 35.525185), (-158.150562, 35.890711), (-157.94863, 36.199304))
        make_face(mode=Mode.SUBTRACT)
        with Locations((-159.982522, 44.556018)):
            Circle(F0_R_2, mode=Mode.SUBTRACT)
    extrude(amount=F1_DEPTH)


solid = f1.part
